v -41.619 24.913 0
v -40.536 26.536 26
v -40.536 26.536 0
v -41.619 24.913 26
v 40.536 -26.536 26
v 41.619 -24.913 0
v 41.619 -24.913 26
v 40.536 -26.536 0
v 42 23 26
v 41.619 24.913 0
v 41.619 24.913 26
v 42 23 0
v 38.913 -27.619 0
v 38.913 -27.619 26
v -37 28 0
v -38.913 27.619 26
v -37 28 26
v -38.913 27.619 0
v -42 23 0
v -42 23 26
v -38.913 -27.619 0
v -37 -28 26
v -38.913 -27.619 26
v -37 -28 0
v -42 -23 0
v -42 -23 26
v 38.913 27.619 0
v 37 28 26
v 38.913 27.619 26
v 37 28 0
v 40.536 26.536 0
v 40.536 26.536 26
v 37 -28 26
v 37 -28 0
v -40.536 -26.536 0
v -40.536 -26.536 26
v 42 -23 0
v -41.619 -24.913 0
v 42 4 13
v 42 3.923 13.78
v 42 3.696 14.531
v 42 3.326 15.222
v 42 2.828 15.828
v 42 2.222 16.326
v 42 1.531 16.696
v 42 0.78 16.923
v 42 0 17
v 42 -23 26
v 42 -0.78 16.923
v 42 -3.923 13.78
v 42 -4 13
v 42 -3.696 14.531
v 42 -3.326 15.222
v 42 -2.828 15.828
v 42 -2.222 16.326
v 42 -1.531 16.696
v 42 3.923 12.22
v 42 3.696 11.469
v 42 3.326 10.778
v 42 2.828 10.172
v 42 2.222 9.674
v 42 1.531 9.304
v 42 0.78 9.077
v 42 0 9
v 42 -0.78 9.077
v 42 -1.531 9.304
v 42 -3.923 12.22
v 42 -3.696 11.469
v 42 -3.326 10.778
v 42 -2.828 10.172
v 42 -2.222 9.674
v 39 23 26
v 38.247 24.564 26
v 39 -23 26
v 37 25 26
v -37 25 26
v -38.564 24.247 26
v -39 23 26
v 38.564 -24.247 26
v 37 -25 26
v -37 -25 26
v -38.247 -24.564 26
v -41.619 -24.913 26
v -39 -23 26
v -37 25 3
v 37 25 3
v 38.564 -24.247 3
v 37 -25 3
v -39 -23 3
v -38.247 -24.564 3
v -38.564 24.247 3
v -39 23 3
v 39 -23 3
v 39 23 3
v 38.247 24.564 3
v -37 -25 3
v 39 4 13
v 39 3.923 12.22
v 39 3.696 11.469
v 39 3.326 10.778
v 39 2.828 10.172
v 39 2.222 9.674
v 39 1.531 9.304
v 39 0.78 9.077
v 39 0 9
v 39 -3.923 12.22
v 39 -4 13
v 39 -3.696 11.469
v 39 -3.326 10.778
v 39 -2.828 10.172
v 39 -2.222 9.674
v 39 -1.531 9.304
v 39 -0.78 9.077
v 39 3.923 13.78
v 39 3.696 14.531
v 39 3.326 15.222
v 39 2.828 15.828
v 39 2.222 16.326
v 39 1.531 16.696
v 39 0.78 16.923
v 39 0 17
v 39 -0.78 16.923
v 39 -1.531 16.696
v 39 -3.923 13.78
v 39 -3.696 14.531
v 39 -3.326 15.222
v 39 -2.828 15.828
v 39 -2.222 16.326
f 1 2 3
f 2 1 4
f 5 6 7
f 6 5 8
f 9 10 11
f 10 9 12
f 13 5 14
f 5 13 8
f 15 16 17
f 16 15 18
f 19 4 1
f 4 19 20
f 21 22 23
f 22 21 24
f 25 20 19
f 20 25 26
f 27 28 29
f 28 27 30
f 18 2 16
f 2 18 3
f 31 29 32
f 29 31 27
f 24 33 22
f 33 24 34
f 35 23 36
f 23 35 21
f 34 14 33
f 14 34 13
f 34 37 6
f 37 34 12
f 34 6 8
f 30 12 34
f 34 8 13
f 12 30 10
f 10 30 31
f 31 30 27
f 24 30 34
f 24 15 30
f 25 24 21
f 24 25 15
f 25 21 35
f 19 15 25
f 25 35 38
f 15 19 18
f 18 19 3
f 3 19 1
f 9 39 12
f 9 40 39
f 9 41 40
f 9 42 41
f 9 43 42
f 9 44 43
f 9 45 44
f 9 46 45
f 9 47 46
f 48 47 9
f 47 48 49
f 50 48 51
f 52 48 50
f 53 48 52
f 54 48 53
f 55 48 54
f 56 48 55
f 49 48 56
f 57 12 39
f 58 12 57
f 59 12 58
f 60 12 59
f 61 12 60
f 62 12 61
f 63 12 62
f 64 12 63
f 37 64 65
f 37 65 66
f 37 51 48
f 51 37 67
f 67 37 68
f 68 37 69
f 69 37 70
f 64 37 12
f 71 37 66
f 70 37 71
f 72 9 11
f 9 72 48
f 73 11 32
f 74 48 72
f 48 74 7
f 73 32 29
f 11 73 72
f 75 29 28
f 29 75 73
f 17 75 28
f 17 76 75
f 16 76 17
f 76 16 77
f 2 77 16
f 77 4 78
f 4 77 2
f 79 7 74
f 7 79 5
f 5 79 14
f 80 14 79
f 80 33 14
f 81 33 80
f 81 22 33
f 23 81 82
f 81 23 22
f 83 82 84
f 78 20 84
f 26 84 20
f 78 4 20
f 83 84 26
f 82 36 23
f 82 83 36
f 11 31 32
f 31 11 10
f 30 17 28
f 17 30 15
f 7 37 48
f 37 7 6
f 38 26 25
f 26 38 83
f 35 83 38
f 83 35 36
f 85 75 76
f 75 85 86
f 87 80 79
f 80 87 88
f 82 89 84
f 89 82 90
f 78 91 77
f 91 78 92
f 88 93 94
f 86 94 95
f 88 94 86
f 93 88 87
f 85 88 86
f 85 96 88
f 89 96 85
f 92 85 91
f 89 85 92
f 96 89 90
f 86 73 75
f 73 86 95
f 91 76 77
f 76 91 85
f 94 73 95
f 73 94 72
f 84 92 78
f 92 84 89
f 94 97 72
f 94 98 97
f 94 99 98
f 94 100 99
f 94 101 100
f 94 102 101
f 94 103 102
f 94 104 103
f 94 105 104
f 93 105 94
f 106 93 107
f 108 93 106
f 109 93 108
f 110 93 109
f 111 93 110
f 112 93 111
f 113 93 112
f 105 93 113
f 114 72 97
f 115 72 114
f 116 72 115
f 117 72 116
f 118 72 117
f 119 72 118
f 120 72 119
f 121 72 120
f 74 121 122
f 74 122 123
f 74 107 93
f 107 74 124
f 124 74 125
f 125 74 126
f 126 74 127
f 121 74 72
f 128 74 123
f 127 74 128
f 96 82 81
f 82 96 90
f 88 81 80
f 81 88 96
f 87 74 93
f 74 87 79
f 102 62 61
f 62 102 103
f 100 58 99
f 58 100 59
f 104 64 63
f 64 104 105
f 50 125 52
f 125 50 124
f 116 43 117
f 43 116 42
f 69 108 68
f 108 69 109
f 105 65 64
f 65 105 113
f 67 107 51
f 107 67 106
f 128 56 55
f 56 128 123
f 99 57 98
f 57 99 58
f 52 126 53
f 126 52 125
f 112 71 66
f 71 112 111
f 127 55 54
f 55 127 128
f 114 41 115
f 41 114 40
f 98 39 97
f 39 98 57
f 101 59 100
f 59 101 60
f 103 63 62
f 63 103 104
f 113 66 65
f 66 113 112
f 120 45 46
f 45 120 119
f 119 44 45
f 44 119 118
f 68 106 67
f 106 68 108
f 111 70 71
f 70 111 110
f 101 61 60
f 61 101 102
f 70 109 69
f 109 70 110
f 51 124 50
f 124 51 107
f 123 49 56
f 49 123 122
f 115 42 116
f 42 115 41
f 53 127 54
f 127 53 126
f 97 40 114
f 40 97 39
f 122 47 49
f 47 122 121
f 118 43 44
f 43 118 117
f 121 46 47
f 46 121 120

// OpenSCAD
// Deterministic production smoke for meshy-dcc-openscad.
width = 84;
depth = 56;
height = 26;
wall = 3;
corner_radius = 5;
vent_count = 5;

module rounded_plate(size_x, size_y, size_z, radius) {
    linear_extrude(height=size_z)
        offset(r=radius)
            square([size_x - 2 * radius, size_y - 2 * radius], center=true);
}

module enclosure_shell() {
    difference() {
        rounded_plate(width, depth, height, corner_radius);
        translate([0, 0, wall])
            rounded_plate(
                width - 2 * wall,
                depth - 2 * wall,
                height,
                max(1, corner_radius - wall)
            );
        for (index = [0 : vent_count - 1]) {
            translate([(index - (vent_count - 1) / 2) * 10, 0, height - wall])
                cube([5, depth - 16, wall * 3], center=true);
        }
        translate([width / 2 - wall, 0, height / 2])
            rotate([0, 90, 0])
                cylinder(h=wall * 3, r=4, center=true, $fn=32);
    }
}

enclosure_shell();
